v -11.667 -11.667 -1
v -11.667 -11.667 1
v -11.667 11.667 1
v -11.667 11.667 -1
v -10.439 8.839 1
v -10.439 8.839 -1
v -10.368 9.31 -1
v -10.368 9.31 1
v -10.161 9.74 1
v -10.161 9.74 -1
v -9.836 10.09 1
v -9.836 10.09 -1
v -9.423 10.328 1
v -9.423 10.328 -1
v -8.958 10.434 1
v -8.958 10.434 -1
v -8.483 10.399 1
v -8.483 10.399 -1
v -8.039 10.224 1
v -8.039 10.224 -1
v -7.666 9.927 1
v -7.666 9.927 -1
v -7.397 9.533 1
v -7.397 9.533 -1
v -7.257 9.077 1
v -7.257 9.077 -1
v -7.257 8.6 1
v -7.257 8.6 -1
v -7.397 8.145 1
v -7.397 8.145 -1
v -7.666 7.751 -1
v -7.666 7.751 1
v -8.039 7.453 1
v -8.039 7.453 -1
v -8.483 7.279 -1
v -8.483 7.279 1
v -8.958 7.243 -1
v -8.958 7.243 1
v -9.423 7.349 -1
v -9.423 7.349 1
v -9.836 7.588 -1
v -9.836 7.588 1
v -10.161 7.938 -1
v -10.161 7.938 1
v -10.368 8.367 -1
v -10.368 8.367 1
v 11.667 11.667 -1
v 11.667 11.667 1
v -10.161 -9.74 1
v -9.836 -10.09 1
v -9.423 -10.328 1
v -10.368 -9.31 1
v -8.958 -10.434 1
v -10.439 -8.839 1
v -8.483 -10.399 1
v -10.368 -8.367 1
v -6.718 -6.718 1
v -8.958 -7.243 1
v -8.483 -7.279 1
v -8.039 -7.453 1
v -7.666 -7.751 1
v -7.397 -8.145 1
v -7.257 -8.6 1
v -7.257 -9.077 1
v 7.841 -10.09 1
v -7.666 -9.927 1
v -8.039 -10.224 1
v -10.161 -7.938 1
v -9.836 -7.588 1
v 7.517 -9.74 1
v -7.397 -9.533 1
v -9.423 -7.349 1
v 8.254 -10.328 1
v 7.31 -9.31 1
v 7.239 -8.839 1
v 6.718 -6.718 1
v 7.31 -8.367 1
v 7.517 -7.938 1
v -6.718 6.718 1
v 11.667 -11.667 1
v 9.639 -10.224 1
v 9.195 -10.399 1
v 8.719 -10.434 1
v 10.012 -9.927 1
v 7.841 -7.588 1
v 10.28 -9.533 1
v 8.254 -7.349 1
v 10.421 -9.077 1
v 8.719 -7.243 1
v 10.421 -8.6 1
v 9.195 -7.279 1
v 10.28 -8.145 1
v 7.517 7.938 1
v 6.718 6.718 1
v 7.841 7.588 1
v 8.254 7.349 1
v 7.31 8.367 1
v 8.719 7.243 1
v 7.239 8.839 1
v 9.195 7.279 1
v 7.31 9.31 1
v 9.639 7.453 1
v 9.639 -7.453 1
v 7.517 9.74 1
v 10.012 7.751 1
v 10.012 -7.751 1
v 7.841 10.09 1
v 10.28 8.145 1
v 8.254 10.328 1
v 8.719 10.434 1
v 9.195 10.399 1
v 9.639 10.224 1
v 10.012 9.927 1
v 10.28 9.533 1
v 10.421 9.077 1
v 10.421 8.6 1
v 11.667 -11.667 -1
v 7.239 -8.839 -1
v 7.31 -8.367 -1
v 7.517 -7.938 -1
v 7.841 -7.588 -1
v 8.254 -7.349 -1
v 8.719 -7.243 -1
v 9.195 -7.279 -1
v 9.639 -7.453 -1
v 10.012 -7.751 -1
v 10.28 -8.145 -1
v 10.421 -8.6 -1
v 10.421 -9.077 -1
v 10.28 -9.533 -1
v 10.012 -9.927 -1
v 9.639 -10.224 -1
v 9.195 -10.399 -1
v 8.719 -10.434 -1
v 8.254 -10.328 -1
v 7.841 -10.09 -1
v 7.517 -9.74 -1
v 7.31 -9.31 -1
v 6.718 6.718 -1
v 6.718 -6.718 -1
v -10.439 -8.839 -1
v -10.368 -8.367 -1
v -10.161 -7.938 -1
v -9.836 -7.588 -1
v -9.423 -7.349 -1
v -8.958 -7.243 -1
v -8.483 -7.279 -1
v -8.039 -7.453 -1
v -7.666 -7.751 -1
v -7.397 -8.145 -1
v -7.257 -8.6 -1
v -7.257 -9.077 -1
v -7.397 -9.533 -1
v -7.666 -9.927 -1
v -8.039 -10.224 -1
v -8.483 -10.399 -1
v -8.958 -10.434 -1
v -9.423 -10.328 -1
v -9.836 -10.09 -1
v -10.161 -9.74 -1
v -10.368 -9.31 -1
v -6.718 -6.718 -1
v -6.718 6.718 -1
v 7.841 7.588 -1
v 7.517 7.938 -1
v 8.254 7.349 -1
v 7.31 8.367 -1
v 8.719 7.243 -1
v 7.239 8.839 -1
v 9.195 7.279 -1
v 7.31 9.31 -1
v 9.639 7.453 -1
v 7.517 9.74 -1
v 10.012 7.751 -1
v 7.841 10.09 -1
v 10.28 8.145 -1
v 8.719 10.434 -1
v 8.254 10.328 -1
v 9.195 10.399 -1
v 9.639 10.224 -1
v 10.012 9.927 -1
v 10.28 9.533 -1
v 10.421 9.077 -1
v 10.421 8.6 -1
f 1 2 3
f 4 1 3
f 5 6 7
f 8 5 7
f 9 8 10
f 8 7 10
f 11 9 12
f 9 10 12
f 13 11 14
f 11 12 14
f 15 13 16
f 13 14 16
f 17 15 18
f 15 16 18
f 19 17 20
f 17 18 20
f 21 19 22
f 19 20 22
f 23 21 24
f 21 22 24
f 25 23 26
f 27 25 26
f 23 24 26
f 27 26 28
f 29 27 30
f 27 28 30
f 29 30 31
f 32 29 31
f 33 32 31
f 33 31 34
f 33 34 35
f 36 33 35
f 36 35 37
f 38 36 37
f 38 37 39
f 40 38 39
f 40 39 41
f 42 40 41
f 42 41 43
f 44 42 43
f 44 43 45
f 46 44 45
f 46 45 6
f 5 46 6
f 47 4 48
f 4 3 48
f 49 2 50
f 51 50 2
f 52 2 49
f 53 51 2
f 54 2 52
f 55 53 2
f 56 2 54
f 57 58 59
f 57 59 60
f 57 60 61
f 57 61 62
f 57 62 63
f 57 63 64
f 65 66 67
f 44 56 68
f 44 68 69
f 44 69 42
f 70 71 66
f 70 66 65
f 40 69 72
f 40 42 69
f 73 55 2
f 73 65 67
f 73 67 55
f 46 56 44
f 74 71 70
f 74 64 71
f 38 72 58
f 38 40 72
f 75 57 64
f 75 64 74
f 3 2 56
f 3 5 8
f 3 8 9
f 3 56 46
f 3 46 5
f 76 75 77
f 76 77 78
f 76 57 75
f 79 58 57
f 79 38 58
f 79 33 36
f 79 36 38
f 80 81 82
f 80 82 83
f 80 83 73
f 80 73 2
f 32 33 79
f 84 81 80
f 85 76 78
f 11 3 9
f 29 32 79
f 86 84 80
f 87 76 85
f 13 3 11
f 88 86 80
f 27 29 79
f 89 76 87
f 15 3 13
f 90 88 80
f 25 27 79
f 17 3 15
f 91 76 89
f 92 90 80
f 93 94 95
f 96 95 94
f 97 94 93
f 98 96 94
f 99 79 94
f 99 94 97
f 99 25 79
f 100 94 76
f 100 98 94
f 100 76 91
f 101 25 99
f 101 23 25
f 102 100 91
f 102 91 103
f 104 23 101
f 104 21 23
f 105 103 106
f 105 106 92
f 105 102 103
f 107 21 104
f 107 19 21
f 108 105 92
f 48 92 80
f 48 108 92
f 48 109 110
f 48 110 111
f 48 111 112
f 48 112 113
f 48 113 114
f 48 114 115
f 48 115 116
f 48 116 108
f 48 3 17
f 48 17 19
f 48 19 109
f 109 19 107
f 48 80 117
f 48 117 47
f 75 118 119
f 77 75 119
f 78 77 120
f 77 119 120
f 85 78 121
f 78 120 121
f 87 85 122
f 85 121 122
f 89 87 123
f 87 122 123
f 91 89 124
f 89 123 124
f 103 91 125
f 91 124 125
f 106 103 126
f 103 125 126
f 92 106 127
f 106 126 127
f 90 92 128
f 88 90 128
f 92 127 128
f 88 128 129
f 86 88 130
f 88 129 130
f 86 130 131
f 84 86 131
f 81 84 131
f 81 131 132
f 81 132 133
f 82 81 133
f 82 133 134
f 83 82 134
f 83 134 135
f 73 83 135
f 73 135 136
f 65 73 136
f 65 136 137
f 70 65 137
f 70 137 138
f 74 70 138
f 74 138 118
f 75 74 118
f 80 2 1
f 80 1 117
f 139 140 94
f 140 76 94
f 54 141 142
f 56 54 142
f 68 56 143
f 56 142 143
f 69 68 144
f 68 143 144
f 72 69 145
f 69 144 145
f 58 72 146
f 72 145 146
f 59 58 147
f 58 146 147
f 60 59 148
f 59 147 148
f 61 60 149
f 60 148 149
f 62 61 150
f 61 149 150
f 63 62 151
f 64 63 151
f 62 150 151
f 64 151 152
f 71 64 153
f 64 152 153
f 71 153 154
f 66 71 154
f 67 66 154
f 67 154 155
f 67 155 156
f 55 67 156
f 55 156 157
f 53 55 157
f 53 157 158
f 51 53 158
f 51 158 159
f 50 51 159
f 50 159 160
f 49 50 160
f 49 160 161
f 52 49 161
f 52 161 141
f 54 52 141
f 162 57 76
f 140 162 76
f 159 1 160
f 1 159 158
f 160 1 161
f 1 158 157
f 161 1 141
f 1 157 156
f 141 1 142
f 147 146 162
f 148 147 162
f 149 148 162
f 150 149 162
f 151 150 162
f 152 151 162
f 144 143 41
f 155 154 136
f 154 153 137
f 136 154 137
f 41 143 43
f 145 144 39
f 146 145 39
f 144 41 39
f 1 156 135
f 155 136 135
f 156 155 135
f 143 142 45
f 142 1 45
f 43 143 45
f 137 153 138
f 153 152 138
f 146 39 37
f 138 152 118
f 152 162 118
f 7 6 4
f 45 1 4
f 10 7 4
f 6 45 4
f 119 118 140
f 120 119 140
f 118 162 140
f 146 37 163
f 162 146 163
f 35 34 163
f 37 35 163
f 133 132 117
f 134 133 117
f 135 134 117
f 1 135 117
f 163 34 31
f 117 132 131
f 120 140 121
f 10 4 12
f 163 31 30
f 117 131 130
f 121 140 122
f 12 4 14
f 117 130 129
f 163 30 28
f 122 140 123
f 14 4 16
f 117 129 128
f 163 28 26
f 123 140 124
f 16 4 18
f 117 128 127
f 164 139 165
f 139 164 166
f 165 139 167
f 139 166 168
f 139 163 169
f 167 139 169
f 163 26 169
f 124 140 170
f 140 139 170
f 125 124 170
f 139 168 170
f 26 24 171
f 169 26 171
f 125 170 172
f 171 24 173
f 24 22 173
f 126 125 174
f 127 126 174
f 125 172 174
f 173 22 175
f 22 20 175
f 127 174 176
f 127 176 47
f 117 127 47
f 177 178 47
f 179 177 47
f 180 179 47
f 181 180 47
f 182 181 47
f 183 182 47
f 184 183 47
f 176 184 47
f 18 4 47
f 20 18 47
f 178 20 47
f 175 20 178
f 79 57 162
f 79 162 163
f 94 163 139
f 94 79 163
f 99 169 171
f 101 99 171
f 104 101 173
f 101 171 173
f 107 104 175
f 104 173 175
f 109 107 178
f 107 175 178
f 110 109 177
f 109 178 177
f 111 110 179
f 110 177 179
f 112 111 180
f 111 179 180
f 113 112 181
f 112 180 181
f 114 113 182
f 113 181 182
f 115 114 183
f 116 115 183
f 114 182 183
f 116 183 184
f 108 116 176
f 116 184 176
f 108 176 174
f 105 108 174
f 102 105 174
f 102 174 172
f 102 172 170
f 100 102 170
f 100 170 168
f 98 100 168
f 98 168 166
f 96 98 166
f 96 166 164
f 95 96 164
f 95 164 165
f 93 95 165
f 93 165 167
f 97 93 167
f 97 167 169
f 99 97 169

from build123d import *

# Parameters (mm, degrees)
SKETCH1_W           = 23.33452378
SKETCH1_H           = 23.33452378
SKETCH1_W_2         = 13.435028842
SKETCH1_H_2         = 13.435028842
BOSS_EXTRUDE1_DEPTH = 1
SKETCH2_R           = 1.6
CUT_EXTRUDE1_DEPTH  = 3


with BuildPart() as part:
    # Sketch1 → Boss-Extrude1 (new body, symmetric)
    with BuildSketch(Plane.XY):
        Rectangle(SKETCH1_W, SKETCH1_H)
        Rectangle(SKETCH1_W_2, SKETCH1_H_2, mode=Mode.SUBTRACT)
    extrude(amount=BOSS_EXTRUDE1_DEPTH, both=True)

    # Sketch2 → Cut-Extrude1 (cut, through all)
    with BuildSketch(Plane(origin=(0, 0, -1), x_dir=(-1, 0, 0), z_dir=(0, 0, -1))):
        with Locations((8.838834765, -8.838834765)):
            Circle(SKETCH2_R)
        with Locations((8.838834765, 8.838834765)):
            Circle(SKETCH2_R)
        with Locations((-8.838834765, -8.838834765)):
            Circle(SKETCH2_R)
        with Locations((-8.838834765, 8.838834765)):
            Circle(SKETCH2_R)
    extrude(amount=-CUT_EXTRUDE1_DEPTH, mode=Mode.SUBTRACT)


solid = part.part
